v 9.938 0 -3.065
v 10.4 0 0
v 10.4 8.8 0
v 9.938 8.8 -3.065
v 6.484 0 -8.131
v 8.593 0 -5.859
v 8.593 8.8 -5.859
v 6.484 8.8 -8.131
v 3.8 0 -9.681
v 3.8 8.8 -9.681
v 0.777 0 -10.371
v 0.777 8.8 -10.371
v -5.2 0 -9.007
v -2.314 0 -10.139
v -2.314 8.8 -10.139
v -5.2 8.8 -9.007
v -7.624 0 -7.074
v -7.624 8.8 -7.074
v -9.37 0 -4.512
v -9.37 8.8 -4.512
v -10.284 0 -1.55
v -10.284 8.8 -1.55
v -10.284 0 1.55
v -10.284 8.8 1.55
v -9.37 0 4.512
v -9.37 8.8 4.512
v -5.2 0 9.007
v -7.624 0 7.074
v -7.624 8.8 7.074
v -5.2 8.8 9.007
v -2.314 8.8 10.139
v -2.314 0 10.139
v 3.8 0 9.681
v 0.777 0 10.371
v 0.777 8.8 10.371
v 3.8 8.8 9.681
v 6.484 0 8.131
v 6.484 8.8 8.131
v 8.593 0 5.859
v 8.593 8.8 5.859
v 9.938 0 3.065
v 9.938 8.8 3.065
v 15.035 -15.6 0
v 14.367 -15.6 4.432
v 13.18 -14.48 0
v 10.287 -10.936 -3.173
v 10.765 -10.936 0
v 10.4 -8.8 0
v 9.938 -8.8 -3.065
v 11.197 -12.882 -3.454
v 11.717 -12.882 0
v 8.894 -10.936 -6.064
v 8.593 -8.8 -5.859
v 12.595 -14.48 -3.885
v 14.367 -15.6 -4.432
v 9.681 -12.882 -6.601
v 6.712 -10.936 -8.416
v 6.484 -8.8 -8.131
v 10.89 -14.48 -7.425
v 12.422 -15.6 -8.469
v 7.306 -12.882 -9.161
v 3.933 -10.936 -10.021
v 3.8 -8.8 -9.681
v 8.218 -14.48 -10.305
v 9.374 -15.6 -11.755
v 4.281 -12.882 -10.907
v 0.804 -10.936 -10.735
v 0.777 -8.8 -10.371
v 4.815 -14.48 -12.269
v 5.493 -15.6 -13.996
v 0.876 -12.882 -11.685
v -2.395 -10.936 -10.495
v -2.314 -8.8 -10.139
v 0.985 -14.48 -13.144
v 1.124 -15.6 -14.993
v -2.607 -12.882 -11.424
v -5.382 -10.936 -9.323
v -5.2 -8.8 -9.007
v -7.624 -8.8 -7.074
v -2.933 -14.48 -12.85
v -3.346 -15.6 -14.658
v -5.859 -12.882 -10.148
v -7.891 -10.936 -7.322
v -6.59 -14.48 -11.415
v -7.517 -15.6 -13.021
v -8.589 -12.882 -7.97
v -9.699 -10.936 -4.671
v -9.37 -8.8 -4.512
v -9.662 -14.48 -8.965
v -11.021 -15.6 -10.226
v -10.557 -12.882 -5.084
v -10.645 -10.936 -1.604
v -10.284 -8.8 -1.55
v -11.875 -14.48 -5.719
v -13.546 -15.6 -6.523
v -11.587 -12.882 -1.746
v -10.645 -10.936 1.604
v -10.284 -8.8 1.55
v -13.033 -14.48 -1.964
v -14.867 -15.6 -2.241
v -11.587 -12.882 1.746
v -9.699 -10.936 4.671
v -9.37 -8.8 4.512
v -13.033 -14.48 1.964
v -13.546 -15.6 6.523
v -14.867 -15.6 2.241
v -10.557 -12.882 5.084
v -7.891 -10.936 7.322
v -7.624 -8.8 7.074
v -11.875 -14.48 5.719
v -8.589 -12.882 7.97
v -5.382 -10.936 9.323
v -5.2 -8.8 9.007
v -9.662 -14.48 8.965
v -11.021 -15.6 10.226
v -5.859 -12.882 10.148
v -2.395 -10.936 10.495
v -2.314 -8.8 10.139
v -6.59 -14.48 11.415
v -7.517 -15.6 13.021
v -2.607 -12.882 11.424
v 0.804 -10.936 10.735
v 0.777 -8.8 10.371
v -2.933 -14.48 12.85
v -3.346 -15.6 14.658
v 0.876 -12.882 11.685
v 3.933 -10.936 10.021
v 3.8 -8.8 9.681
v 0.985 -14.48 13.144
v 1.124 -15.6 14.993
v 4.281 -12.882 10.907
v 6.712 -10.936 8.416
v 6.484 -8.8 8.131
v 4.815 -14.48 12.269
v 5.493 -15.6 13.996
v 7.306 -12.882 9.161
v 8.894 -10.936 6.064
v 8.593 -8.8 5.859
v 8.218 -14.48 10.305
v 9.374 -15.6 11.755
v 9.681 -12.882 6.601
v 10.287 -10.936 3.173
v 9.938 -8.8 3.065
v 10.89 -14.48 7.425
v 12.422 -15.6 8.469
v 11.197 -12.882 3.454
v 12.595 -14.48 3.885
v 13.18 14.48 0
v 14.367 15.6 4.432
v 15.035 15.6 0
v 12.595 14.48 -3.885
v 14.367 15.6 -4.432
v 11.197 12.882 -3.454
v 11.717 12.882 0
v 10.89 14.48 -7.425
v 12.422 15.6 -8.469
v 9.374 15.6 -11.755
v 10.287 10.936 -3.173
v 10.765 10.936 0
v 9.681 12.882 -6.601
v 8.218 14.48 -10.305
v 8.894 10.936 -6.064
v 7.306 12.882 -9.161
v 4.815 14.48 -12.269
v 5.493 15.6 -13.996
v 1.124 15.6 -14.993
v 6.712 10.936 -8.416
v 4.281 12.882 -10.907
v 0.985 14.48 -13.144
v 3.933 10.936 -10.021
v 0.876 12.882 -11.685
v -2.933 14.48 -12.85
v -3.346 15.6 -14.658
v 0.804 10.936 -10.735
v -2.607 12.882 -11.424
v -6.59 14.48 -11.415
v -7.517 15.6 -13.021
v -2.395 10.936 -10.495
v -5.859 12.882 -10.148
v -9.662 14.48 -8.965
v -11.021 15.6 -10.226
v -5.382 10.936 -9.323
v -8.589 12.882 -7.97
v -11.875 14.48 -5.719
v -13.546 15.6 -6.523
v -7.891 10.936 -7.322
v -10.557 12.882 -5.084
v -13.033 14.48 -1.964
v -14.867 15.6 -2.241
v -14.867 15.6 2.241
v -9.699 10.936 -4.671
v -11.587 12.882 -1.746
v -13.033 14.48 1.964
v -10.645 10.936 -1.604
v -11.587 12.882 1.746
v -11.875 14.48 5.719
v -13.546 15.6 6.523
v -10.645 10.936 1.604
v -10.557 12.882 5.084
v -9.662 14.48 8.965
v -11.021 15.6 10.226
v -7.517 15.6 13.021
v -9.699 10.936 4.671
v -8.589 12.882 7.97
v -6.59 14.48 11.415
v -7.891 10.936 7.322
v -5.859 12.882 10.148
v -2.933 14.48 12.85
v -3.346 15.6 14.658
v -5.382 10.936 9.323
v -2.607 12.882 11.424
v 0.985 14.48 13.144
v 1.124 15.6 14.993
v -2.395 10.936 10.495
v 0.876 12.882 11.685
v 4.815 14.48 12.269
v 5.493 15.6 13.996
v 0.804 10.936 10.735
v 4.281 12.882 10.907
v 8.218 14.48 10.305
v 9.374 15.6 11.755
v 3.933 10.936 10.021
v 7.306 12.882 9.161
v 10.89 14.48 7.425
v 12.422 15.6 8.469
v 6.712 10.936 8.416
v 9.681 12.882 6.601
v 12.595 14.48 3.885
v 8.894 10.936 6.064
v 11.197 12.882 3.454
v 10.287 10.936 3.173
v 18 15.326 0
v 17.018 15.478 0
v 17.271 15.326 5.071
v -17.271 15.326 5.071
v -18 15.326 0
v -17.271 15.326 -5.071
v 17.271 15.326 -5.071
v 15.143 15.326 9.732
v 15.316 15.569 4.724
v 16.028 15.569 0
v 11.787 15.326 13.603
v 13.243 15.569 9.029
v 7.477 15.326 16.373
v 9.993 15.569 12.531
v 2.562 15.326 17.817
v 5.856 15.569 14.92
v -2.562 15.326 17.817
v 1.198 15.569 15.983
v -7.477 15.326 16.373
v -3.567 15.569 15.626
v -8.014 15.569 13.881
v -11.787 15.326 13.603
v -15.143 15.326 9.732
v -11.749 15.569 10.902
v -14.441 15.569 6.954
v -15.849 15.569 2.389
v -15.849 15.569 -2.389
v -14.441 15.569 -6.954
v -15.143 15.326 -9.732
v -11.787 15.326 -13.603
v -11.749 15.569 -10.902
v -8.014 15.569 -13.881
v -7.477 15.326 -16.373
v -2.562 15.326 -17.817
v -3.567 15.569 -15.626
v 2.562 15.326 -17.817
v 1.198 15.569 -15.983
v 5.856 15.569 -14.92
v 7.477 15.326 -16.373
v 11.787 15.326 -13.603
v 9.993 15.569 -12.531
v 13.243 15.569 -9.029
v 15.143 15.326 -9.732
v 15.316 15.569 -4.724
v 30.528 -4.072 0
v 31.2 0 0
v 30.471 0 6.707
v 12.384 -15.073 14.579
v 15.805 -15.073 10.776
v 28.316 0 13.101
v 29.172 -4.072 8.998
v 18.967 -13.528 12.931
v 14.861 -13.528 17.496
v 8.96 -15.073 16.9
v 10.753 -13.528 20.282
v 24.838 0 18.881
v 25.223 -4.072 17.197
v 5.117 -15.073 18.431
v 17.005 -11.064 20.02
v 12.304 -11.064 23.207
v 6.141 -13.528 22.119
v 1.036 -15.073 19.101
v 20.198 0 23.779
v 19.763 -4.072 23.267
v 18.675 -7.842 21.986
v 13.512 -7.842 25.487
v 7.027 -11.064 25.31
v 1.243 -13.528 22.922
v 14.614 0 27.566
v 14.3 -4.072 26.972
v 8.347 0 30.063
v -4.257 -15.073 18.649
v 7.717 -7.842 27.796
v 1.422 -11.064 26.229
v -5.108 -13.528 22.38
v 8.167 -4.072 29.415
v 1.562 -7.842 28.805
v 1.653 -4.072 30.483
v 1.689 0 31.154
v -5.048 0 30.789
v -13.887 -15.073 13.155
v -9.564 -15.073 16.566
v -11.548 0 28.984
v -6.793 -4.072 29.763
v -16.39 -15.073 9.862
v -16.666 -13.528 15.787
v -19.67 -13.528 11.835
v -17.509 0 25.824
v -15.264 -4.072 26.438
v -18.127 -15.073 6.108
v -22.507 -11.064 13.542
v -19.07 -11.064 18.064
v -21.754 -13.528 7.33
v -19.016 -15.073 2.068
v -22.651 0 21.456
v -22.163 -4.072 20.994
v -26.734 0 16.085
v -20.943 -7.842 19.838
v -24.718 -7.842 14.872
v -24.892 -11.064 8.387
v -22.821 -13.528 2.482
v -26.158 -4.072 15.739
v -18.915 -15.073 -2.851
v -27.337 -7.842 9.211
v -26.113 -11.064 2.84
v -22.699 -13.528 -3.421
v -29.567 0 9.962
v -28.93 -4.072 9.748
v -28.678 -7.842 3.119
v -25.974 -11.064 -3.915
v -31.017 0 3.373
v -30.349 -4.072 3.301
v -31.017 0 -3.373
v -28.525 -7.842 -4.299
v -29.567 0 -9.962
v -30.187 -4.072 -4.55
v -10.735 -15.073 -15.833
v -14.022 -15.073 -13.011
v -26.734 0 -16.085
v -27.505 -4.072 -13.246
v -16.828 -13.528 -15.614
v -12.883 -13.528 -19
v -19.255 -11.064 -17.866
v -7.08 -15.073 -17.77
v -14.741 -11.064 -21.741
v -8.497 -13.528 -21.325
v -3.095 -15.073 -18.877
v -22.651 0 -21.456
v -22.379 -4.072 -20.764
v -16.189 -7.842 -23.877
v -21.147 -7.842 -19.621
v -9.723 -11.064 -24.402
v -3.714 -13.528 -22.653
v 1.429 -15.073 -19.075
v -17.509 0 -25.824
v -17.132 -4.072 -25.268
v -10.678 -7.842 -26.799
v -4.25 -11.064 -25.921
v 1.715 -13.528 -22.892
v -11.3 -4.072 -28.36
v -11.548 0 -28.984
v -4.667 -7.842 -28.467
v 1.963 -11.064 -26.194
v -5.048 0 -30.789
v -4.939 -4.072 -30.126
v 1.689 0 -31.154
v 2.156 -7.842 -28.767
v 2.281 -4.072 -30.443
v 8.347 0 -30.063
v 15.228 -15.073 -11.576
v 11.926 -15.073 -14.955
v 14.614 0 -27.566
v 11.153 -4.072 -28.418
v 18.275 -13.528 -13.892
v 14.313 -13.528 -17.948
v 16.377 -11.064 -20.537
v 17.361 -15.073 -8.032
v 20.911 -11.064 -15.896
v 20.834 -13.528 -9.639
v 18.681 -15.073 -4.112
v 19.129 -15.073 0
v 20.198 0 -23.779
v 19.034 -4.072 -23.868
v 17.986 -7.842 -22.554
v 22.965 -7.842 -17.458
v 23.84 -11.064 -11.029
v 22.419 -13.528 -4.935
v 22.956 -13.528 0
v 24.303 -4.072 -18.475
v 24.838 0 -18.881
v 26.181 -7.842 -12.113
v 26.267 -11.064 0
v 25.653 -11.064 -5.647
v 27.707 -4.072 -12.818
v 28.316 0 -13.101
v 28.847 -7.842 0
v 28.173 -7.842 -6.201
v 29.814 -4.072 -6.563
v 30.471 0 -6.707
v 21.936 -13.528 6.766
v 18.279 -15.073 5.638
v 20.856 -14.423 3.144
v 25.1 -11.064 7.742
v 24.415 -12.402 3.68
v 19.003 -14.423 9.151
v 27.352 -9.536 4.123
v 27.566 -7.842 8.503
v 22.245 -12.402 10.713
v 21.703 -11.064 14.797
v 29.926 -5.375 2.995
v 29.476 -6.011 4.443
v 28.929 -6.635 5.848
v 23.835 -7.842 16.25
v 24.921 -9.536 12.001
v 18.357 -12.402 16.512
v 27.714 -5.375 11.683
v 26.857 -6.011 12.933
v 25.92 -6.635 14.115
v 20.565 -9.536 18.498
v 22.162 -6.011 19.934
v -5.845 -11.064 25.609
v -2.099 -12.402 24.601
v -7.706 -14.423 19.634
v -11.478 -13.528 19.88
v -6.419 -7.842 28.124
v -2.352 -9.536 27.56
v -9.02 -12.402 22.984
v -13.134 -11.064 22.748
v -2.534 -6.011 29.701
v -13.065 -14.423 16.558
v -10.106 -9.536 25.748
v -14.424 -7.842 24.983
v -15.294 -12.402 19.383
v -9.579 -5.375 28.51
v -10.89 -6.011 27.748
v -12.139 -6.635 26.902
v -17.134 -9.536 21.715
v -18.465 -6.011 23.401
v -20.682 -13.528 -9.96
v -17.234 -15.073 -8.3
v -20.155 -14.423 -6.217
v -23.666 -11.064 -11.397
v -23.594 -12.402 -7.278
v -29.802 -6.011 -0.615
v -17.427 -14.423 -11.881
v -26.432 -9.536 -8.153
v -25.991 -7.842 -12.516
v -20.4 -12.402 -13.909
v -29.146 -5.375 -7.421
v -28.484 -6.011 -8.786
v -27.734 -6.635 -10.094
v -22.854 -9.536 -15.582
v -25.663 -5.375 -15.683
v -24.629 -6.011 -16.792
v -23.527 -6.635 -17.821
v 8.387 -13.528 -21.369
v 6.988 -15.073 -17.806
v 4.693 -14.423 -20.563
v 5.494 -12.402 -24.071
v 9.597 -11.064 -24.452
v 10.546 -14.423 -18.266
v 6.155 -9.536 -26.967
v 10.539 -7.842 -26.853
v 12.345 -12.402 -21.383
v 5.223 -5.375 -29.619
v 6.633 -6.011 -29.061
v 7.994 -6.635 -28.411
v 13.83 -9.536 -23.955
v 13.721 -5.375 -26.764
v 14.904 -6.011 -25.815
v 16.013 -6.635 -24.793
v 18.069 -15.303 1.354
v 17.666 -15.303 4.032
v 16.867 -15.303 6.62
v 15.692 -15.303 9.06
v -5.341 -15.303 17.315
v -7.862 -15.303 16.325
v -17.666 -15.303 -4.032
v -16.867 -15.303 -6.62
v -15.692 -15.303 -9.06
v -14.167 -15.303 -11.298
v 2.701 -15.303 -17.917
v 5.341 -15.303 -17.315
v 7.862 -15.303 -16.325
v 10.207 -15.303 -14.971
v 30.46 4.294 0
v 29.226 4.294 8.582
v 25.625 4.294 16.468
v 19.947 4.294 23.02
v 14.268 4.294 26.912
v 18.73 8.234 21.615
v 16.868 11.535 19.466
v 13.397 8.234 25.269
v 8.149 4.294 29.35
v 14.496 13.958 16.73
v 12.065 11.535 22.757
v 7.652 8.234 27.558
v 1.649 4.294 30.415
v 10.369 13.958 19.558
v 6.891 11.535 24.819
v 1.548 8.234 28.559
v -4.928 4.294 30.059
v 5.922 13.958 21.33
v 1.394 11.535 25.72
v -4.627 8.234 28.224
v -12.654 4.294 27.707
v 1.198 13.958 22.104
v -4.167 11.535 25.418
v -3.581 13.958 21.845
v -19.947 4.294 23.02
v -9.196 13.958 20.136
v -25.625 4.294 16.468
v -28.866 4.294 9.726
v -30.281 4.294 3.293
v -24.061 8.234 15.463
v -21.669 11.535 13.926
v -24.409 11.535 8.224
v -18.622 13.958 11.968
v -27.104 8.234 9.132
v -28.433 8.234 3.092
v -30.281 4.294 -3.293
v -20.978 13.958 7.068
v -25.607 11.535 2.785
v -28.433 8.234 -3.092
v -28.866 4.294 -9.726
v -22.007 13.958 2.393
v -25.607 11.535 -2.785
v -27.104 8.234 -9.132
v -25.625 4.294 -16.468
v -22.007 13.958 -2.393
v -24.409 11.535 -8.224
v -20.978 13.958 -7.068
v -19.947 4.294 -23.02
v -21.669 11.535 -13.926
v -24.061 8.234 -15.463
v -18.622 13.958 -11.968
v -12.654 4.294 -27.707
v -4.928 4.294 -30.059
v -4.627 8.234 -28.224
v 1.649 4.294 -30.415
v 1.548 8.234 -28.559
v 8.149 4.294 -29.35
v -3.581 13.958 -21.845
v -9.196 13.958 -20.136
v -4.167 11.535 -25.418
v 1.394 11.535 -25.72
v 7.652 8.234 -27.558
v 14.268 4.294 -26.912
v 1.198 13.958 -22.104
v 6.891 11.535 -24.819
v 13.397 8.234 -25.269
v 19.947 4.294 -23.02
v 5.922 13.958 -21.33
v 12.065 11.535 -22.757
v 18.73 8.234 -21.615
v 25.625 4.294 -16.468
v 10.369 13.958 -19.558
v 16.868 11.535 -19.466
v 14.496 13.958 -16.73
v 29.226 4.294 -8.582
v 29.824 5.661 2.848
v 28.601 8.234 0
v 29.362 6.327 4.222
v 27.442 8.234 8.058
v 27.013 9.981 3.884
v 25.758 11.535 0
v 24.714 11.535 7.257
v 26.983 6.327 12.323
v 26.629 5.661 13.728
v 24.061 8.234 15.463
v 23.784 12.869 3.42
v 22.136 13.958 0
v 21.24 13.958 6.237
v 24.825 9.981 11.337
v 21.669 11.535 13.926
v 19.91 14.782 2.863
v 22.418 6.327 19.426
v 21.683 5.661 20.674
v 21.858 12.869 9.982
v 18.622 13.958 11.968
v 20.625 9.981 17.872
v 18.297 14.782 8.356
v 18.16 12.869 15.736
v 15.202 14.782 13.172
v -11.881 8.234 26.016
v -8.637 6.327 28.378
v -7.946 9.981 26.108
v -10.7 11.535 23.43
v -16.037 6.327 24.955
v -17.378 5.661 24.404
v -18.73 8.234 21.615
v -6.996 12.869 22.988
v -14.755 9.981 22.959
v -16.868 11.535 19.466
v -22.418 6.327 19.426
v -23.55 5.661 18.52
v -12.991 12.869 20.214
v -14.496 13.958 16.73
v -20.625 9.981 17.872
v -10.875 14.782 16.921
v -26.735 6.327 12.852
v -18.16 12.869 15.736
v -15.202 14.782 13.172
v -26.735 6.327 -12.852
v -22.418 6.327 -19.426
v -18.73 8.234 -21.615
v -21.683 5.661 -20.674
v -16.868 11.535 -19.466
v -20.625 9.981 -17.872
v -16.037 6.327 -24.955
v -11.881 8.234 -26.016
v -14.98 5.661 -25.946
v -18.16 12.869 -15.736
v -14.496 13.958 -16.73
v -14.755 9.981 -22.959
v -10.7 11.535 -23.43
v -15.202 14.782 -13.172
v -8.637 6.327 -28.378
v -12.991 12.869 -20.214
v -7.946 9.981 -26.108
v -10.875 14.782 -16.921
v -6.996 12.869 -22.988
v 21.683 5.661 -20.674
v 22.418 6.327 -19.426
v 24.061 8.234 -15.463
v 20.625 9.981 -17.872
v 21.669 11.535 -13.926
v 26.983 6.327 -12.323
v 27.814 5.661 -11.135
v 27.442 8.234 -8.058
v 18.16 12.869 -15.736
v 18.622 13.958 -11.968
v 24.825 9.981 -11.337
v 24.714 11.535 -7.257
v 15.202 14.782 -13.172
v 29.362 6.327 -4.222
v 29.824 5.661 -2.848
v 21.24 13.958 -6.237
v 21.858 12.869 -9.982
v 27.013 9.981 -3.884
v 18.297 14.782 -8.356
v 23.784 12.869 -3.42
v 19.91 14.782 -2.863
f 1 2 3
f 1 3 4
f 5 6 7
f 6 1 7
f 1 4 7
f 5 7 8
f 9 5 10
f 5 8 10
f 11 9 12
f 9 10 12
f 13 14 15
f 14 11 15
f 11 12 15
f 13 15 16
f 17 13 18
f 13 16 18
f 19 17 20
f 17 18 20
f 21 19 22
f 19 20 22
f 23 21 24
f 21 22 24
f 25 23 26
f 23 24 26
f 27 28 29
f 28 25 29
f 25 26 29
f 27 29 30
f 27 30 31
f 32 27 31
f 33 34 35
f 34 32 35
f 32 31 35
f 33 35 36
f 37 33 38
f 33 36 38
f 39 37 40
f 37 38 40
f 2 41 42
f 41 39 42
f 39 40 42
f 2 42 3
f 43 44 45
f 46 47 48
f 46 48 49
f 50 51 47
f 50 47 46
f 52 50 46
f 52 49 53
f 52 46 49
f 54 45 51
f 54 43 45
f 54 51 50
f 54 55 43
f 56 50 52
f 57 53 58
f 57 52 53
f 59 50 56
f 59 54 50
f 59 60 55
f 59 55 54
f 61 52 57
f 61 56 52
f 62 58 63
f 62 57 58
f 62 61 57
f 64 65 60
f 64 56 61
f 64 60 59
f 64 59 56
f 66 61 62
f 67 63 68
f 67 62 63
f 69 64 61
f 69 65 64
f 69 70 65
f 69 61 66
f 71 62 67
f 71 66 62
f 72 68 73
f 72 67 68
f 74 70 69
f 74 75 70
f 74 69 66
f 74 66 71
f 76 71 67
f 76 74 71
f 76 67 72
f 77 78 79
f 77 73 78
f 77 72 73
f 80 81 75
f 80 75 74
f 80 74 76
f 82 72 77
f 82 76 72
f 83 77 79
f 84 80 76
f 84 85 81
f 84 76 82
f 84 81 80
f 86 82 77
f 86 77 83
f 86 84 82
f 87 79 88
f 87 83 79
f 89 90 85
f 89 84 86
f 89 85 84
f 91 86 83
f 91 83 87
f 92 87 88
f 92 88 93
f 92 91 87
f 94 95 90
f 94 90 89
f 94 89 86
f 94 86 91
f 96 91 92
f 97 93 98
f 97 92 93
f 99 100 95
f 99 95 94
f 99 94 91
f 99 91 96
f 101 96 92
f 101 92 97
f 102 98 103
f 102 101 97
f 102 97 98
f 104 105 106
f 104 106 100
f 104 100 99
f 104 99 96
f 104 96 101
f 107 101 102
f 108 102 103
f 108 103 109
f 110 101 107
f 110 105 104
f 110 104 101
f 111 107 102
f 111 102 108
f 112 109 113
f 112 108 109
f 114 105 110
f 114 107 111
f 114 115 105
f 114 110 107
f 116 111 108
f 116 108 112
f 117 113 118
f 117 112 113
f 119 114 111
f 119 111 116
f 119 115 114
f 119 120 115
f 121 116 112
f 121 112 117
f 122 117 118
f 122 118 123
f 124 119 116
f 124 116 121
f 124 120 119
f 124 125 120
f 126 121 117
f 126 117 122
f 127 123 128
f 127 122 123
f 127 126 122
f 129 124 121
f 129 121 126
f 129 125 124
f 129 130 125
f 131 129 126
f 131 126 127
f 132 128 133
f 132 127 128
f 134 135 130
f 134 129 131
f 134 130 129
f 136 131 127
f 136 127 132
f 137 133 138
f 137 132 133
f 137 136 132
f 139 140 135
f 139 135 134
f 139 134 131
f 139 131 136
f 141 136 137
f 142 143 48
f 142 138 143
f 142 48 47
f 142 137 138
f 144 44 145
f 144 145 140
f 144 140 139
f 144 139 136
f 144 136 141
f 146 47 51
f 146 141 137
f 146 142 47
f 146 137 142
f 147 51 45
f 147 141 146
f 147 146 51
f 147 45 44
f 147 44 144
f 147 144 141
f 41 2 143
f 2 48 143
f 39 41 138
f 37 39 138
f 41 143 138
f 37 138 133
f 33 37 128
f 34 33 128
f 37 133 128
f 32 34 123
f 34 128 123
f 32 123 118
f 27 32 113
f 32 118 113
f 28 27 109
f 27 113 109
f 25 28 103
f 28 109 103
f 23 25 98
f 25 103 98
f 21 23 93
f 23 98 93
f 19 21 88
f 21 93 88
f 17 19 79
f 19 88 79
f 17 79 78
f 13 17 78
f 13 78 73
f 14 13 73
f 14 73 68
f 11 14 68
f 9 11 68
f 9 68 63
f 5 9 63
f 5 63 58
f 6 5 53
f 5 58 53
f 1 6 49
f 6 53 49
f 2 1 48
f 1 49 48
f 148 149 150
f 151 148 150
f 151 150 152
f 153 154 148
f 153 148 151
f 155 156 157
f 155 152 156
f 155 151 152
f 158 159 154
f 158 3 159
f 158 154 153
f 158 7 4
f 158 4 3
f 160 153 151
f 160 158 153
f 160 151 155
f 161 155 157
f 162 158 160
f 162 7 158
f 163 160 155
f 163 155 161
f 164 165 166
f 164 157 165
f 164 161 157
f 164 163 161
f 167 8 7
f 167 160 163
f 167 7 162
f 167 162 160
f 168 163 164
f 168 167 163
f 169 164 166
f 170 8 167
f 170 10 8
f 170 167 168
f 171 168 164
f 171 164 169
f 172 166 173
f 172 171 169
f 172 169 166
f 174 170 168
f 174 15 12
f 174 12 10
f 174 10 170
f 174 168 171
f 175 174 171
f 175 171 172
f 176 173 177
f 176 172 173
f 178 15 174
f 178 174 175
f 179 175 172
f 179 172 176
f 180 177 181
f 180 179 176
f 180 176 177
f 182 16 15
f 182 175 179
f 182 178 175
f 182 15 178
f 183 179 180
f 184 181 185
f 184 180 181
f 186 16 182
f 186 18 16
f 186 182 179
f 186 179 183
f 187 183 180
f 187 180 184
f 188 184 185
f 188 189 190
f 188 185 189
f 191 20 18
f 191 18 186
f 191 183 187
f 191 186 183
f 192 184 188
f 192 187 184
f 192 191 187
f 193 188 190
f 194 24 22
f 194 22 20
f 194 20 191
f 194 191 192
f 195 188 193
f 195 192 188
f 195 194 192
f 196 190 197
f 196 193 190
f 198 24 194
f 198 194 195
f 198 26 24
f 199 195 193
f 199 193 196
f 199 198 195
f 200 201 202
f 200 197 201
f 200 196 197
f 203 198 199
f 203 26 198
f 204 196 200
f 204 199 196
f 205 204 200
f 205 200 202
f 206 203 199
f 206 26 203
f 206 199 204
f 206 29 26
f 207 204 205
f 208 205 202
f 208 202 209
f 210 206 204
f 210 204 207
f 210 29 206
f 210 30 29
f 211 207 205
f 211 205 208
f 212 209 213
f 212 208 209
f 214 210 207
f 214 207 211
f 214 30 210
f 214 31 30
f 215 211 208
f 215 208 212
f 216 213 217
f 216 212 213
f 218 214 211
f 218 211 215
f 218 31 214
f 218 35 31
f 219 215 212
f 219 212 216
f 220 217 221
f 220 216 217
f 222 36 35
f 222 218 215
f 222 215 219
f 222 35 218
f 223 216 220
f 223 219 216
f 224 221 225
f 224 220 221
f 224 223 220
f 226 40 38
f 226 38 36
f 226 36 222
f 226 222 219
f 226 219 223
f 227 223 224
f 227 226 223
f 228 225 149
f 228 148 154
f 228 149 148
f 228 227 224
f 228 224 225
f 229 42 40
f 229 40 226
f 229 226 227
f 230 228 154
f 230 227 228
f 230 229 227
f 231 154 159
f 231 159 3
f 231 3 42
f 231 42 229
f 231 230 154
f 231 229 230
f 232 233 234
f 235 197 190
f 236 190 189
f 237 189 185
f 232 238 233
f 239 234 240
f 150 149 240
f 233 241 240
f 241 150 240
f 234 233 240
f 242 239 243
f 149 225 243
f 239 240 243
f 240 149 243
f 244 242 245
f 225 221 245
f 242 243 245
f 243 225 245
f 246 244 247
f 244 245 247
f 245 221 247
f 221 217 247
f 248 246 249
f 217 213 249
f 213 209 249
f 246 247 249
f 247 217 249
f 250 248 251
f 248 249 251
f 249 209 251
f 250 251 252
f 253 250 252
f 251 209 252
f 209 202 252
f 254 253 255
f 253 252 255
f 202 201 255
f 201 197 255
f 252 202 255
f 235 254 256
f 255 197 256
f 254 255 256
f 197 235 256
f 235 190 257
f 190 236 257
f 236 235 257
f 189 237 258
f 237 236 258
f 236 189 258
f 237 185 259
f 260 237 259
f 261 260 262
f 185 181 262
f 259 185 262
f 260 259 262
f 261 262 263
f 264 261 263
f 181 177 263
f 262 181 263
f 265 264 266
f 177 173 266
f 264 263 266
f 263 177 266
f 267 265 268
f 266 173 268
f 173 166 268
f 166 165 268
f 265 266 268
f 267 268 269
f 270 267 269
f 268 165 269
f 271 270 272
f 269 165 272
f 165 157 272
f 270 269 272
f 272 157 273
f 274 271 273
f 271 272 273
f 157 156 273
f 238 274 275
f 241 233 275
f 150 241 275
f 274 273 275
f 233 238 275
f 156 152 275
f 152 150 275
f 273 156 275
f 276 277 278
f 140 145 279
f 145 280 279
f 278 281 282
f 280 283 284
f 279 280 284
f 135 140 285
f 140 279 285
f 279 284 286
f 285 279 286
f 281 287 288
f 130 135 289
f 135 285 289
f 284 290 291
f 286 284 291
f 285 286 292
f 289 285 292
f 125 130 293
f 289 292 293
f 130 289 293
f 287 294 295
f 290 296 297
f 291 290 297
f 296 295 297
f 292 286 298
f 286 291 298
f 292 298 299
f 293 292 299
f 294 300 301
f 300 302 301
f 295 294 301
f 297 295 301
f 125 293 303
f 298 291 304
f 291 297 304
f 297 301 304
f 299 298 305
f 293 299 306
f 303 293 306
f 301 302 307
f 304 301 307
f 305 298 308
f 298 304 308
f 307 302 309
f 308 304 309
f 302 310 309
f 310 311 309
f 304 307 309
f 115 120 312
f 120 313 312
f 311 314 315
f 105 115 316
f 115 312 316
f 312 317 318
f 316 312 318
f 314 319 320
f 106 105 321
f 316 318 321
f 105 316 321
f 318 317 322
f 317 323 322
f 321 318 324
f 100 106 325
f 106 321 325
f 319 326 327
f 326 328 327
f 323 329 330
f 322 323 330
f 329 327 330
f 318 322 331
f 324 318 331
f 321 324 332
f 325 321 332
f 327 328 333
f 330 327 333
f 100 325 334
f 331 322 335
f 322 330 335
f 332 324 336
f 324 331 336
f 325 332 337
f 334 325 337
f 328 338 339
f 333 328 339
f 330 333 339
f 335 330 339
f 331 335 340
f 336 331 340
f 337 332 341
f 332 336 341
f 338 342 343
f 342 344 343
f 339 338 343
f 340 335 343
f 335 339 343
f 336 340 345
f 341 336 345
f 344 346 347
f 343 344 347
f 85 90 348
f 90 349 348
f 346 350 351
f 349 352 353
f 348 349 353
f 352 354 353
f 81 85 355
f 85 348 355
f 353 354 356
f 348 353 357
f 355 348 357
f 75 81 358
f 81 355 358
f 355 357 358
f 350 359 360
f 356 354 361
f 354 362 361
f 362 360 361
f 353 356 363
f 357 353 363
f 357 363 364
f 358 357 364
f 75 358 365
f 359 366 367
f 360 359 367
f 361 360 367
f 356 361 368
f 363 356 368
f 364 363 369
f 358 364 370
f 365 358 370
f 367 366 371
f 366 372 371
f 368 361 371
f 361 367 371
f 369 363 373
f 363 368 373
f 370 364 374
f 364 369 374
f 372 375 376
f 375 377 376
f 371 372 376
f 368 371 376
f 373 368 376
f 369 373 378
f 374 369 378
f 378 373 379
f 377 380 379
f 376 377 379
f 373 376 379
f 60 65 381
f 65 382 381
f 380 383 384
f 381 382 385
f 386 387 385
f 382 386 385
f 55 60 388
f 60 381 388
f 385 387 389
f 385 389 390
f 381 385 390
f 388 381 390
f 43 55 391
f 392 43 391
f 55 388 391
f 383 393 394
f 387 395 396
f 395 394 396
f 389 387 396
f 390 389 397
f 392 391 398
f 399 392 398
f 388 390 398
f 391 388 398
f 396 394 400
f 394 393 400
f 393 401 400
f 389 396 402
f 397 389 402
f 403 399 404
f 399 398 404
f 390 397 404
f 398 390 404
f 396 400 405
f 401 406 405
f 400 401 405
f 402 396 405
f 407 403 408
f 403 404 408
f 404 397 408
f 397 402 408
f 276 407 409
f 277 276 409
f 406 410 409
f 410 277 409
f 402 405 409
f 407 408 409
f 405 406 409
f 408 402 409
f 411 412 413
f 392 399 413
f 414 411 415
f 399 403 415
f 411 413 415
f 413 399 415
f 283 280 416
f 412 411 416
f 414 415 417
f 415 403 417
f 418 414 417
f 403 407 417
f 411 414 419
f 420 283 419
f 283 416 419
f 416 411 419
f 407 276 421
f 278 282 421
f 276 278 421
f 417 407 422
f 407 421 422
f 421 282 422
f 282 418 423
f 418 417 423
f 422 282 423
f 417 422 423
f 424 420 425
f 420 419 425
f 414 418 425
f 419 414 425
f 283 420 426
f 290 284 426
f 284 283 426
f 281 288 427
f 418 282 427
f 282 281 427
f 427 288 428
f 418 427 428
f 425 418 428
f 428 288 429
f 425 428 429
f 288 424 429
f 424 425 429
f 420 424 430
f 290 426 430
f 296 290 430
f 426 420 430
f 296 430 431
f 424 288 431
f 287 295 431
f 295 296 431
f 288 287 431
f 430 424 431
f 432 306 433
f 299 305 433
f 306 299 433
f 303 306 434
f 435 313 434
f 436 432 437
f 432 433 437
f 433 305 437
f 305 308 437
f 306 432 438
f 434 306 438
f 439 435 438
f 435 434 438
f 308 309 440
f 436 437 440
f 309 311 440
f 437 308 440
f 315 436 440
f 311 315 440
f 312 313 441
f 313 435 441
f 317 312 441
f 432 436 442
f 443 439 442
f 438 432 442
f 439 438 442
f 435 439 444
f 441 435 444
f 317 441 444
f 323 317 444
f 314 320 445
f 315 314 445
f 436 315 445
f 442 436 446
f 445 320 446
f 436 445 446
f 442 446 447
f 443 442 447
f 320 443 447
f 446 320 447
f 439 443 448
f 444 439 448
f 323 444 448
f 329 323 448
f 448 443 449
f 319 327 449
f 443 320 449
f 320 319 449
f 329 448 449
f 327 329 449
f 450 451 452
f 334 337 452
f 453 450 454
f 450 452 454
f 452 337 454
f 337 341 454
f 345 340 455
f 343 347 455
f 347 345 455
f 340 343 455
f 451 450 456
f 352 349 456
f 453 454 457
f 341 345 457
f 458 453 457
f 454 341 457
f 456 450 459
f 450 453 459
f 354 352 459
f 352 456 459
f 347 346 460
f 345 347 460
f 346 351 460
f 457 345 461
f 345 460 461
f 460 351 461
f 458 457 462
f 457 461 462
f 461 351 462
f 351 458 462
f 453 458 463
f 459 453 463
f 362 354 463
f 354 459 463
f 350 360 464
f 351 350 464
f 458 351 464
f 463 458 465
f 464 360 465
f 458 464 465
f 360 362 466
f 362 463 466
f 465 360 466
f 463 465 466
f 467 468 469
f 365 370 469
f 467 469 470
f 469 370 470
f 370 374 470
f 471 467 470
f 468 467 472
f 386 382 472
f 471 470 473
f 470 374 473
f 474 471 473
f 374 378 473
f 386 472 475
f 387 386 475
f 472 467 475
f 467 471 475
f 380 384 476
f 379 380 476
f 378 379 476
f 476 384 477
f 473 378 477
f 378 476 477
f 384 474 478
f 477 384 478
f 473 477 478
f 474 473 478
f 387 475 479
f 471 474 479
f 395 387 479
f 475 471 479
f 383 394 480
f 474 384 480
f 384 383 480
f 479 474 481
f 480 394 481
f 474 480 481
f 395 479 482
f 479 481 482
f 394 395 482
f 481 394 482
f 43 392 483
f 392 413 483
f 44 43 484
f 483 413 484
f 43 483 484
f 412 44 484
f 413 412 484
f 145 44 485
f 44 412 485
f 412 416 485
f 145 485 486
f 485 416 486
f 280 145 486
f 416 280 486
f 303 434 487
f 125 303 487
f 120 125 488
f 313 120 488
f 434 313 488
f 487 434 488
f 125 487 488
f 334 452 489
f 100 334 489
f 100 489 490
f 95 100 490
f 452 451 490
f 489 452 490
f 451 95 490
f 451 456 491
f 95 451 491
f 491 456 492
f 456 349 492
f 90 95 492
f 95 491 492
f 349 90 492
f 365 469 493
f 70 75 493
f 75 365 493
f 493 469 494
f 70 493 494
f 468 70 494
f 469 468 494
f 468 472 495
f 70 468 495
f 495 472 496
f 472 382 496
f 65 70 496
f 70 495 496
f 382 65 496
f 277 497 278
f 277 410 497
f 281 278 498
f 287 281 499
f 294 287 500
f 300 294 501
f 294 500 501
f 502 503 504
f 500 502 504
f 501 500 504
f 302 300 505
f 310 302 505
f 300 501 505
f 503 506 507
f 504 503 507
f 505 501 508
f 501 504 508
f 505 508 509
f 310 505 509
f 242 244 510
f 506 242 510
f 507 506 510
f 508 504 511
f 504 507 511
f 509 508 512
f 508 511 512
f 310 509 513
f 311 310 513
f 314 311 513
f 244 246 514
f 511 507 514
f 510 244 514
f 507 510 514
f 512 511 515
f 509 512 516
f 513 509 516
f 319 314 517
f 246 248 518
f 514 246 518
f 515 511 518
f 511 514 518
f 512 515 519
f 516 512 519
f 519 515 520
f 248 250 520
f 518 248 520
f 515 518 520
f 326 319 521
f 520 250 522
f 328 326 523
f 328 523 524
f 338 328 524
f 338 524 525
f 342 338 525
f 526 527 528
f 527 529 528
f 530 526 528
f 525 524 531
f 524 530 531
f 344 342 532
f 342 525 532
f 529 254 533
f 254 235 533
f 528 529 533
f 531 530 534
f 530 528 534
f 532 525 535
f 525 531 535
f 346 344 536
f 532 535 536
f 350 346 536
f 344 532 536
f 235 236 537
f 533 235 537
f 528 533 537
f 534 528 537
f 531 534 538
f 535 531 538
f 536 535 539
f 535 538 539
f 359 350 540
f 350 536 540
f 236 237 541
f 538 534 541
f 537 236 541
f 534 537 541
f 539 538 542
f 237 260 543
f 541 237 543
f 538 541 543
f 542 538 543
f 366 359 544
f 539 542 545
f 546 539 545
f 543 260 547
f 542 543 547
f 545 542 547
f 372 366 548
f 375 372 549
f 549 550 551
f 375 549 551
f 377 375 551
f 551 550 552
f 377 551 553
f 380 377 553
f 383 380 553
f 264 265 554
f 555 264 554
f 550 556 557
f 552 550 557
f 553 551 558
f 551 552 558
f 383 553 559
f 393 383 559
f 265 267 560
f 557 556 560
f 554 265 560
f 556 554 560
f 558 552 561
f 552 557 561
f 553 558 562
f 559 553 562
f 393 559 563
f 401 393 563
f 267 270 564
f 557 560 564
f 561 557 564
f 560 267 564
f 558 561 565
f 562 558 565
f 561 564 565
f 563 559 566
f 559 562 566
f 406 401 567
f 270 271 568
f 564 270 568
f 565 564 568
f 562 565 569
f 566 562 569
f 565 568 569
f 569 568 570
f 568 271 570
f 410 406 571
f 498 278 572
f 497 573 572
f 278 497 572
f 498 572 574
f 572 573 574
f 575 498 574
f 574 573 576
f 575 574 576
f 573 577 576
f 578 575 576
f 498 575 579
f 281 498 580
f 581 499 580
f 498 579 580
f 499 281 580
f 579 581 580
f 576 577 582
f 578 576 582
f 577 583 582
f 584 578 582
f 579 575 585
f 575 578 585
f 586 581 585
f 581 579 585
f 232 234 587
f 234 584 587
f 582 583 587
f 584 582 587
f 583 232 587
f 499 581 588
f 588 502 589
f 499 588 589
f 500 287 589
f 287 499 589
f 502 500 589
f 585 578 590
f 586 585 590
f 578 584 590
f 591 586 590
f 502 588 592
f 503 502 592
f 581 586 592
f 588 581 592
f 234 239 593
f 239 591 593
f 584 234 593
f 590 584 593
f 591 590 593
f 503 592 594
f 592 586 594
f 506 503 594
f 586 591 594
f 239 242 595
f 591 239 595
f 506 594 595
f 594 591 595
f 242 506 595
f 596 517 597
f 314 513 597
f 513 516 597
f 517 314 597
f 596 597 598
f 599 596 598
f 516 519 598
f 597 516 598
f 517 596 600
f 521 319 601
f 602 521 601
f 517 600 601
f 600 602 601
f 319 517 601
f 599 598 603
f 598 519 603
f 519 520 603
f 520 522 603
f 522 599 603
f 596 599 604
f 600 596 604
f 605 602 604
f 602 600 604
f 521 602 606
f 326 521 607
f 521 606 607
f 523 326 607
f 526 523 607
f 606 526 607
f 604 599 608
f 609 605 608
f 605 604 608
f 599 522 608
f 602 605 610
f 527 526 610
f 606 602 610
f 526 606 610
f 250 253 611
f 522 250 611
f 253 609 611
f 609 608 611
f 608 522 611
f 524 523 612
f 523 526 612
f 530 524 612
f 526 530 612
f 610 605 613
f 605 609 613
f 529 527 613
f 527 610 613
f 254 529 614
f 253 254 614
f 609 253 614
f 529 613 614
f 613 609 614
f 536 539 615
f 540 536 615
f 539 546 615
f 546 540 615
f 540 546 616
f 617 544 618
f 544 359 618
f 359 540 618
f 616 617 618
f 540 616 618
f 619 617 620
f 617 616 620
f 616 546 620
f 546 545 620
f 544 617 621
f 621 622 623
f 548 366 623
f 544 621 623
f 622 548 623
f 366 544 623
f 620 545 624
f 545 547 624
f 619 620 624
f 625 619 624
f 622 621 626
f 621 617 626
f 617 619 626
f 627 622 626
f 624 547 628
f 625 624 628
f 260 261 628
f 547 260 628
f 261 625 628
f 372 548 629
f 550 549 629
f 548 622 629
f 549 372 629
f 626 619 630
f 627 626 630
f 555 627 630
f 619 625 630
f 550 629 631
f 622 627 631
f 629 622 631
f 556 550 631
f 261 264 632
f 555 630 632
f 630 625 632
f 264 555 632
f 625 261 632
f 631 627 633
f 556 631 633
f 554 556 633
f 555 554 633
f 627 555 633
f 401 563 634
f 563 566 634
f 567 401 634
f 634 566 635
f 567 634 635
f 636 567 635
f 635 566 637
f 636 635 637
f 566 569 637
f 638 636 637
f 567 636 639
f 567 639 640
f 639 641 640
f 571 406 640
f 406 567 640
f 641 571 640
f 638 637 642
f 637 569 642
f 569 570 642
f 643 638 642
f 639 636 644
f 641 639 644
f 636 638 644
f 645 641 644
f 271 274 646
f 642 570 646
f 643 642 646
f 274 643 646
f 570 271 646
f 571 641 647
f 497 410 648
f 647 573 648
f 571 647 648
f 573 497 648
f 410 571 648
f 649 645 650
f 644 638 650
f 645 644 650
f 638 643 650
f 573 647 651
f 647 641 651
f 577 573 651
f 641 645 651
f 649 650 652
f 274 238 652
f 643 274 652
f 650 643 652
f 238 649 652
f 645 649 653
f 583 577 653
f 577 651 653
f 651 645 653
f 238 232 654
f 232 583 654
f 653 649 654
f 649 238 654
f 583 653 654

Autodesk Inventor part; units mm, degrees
ref_plane "YZ Plane" through (0, 0, 0) normal (1, 0, 0) x (0, 1, 0)
ref_plane "XZ Plane" through (0, 0, 0) normal (0, 1, 0) x (-1, 0, 0)
ref_plane "XY Plane" through (0, 0, 0) normal (0, 0, 1) x (1, 0, 0)
sketch "Sketch1" plane through (0, 0, 0) normal (0, 0, 1) x (1, 0, 0)
  line L0 (0, 0) -> (10.4, 0)
  line L1 (0, 0) -> (31.2, 0)
  line L2 (0, 0) -> (22.1, 0)
  line L3 (10.4, 0) -> (28.4, 0)
  line L4 (0, 0) -> (18, 0)
  line L5 (10.4, 0) -> (10.4, 8.8)
  arc A0 (15.0348, 15.6) -> (10.4, 8.8) centre (17.9974, 8.6012) ccw
  line L6 (18, 0) -> (18, 15.6)
  line L7 (18, 15.6) -> (15.0348, 15.6)
  arc A1 (31.2, 0) -> (15.0348, 15.6) centre (15.0348, -0.5755) ccw
  line L8 (10.4, 0) -> (10.4, -8.8)
  arc A2 (10.4, -8.8) -> (15.0348, -15.6) centre (17.9974, -8.6012) ccw
  arc A3 (15.0348, -15.6) -> (31.2, 0) centre (15.0348, 0.5755) ccw
  line L9 (0, 0) -> (0, 15.6)
  dimension "d0" = 10.4
  dimension "d1" = 31.2
  dimension "d4" = 18
  dimension "d5" = 8.8
  dimension "d6" = 15.6
revolve "Revolution1" add sketch "Sketch1" angle 360 about axis through (0, 0, 0) along (0, -1, 0) contours L5 A0 A1 L6 L1 | L1 A3 A2 L8 | L6 A1 L1
properties part number "8004_65uH_DCore_2layer_Tx_Filter_MPSv2_v1" material "ABS Plastic"
